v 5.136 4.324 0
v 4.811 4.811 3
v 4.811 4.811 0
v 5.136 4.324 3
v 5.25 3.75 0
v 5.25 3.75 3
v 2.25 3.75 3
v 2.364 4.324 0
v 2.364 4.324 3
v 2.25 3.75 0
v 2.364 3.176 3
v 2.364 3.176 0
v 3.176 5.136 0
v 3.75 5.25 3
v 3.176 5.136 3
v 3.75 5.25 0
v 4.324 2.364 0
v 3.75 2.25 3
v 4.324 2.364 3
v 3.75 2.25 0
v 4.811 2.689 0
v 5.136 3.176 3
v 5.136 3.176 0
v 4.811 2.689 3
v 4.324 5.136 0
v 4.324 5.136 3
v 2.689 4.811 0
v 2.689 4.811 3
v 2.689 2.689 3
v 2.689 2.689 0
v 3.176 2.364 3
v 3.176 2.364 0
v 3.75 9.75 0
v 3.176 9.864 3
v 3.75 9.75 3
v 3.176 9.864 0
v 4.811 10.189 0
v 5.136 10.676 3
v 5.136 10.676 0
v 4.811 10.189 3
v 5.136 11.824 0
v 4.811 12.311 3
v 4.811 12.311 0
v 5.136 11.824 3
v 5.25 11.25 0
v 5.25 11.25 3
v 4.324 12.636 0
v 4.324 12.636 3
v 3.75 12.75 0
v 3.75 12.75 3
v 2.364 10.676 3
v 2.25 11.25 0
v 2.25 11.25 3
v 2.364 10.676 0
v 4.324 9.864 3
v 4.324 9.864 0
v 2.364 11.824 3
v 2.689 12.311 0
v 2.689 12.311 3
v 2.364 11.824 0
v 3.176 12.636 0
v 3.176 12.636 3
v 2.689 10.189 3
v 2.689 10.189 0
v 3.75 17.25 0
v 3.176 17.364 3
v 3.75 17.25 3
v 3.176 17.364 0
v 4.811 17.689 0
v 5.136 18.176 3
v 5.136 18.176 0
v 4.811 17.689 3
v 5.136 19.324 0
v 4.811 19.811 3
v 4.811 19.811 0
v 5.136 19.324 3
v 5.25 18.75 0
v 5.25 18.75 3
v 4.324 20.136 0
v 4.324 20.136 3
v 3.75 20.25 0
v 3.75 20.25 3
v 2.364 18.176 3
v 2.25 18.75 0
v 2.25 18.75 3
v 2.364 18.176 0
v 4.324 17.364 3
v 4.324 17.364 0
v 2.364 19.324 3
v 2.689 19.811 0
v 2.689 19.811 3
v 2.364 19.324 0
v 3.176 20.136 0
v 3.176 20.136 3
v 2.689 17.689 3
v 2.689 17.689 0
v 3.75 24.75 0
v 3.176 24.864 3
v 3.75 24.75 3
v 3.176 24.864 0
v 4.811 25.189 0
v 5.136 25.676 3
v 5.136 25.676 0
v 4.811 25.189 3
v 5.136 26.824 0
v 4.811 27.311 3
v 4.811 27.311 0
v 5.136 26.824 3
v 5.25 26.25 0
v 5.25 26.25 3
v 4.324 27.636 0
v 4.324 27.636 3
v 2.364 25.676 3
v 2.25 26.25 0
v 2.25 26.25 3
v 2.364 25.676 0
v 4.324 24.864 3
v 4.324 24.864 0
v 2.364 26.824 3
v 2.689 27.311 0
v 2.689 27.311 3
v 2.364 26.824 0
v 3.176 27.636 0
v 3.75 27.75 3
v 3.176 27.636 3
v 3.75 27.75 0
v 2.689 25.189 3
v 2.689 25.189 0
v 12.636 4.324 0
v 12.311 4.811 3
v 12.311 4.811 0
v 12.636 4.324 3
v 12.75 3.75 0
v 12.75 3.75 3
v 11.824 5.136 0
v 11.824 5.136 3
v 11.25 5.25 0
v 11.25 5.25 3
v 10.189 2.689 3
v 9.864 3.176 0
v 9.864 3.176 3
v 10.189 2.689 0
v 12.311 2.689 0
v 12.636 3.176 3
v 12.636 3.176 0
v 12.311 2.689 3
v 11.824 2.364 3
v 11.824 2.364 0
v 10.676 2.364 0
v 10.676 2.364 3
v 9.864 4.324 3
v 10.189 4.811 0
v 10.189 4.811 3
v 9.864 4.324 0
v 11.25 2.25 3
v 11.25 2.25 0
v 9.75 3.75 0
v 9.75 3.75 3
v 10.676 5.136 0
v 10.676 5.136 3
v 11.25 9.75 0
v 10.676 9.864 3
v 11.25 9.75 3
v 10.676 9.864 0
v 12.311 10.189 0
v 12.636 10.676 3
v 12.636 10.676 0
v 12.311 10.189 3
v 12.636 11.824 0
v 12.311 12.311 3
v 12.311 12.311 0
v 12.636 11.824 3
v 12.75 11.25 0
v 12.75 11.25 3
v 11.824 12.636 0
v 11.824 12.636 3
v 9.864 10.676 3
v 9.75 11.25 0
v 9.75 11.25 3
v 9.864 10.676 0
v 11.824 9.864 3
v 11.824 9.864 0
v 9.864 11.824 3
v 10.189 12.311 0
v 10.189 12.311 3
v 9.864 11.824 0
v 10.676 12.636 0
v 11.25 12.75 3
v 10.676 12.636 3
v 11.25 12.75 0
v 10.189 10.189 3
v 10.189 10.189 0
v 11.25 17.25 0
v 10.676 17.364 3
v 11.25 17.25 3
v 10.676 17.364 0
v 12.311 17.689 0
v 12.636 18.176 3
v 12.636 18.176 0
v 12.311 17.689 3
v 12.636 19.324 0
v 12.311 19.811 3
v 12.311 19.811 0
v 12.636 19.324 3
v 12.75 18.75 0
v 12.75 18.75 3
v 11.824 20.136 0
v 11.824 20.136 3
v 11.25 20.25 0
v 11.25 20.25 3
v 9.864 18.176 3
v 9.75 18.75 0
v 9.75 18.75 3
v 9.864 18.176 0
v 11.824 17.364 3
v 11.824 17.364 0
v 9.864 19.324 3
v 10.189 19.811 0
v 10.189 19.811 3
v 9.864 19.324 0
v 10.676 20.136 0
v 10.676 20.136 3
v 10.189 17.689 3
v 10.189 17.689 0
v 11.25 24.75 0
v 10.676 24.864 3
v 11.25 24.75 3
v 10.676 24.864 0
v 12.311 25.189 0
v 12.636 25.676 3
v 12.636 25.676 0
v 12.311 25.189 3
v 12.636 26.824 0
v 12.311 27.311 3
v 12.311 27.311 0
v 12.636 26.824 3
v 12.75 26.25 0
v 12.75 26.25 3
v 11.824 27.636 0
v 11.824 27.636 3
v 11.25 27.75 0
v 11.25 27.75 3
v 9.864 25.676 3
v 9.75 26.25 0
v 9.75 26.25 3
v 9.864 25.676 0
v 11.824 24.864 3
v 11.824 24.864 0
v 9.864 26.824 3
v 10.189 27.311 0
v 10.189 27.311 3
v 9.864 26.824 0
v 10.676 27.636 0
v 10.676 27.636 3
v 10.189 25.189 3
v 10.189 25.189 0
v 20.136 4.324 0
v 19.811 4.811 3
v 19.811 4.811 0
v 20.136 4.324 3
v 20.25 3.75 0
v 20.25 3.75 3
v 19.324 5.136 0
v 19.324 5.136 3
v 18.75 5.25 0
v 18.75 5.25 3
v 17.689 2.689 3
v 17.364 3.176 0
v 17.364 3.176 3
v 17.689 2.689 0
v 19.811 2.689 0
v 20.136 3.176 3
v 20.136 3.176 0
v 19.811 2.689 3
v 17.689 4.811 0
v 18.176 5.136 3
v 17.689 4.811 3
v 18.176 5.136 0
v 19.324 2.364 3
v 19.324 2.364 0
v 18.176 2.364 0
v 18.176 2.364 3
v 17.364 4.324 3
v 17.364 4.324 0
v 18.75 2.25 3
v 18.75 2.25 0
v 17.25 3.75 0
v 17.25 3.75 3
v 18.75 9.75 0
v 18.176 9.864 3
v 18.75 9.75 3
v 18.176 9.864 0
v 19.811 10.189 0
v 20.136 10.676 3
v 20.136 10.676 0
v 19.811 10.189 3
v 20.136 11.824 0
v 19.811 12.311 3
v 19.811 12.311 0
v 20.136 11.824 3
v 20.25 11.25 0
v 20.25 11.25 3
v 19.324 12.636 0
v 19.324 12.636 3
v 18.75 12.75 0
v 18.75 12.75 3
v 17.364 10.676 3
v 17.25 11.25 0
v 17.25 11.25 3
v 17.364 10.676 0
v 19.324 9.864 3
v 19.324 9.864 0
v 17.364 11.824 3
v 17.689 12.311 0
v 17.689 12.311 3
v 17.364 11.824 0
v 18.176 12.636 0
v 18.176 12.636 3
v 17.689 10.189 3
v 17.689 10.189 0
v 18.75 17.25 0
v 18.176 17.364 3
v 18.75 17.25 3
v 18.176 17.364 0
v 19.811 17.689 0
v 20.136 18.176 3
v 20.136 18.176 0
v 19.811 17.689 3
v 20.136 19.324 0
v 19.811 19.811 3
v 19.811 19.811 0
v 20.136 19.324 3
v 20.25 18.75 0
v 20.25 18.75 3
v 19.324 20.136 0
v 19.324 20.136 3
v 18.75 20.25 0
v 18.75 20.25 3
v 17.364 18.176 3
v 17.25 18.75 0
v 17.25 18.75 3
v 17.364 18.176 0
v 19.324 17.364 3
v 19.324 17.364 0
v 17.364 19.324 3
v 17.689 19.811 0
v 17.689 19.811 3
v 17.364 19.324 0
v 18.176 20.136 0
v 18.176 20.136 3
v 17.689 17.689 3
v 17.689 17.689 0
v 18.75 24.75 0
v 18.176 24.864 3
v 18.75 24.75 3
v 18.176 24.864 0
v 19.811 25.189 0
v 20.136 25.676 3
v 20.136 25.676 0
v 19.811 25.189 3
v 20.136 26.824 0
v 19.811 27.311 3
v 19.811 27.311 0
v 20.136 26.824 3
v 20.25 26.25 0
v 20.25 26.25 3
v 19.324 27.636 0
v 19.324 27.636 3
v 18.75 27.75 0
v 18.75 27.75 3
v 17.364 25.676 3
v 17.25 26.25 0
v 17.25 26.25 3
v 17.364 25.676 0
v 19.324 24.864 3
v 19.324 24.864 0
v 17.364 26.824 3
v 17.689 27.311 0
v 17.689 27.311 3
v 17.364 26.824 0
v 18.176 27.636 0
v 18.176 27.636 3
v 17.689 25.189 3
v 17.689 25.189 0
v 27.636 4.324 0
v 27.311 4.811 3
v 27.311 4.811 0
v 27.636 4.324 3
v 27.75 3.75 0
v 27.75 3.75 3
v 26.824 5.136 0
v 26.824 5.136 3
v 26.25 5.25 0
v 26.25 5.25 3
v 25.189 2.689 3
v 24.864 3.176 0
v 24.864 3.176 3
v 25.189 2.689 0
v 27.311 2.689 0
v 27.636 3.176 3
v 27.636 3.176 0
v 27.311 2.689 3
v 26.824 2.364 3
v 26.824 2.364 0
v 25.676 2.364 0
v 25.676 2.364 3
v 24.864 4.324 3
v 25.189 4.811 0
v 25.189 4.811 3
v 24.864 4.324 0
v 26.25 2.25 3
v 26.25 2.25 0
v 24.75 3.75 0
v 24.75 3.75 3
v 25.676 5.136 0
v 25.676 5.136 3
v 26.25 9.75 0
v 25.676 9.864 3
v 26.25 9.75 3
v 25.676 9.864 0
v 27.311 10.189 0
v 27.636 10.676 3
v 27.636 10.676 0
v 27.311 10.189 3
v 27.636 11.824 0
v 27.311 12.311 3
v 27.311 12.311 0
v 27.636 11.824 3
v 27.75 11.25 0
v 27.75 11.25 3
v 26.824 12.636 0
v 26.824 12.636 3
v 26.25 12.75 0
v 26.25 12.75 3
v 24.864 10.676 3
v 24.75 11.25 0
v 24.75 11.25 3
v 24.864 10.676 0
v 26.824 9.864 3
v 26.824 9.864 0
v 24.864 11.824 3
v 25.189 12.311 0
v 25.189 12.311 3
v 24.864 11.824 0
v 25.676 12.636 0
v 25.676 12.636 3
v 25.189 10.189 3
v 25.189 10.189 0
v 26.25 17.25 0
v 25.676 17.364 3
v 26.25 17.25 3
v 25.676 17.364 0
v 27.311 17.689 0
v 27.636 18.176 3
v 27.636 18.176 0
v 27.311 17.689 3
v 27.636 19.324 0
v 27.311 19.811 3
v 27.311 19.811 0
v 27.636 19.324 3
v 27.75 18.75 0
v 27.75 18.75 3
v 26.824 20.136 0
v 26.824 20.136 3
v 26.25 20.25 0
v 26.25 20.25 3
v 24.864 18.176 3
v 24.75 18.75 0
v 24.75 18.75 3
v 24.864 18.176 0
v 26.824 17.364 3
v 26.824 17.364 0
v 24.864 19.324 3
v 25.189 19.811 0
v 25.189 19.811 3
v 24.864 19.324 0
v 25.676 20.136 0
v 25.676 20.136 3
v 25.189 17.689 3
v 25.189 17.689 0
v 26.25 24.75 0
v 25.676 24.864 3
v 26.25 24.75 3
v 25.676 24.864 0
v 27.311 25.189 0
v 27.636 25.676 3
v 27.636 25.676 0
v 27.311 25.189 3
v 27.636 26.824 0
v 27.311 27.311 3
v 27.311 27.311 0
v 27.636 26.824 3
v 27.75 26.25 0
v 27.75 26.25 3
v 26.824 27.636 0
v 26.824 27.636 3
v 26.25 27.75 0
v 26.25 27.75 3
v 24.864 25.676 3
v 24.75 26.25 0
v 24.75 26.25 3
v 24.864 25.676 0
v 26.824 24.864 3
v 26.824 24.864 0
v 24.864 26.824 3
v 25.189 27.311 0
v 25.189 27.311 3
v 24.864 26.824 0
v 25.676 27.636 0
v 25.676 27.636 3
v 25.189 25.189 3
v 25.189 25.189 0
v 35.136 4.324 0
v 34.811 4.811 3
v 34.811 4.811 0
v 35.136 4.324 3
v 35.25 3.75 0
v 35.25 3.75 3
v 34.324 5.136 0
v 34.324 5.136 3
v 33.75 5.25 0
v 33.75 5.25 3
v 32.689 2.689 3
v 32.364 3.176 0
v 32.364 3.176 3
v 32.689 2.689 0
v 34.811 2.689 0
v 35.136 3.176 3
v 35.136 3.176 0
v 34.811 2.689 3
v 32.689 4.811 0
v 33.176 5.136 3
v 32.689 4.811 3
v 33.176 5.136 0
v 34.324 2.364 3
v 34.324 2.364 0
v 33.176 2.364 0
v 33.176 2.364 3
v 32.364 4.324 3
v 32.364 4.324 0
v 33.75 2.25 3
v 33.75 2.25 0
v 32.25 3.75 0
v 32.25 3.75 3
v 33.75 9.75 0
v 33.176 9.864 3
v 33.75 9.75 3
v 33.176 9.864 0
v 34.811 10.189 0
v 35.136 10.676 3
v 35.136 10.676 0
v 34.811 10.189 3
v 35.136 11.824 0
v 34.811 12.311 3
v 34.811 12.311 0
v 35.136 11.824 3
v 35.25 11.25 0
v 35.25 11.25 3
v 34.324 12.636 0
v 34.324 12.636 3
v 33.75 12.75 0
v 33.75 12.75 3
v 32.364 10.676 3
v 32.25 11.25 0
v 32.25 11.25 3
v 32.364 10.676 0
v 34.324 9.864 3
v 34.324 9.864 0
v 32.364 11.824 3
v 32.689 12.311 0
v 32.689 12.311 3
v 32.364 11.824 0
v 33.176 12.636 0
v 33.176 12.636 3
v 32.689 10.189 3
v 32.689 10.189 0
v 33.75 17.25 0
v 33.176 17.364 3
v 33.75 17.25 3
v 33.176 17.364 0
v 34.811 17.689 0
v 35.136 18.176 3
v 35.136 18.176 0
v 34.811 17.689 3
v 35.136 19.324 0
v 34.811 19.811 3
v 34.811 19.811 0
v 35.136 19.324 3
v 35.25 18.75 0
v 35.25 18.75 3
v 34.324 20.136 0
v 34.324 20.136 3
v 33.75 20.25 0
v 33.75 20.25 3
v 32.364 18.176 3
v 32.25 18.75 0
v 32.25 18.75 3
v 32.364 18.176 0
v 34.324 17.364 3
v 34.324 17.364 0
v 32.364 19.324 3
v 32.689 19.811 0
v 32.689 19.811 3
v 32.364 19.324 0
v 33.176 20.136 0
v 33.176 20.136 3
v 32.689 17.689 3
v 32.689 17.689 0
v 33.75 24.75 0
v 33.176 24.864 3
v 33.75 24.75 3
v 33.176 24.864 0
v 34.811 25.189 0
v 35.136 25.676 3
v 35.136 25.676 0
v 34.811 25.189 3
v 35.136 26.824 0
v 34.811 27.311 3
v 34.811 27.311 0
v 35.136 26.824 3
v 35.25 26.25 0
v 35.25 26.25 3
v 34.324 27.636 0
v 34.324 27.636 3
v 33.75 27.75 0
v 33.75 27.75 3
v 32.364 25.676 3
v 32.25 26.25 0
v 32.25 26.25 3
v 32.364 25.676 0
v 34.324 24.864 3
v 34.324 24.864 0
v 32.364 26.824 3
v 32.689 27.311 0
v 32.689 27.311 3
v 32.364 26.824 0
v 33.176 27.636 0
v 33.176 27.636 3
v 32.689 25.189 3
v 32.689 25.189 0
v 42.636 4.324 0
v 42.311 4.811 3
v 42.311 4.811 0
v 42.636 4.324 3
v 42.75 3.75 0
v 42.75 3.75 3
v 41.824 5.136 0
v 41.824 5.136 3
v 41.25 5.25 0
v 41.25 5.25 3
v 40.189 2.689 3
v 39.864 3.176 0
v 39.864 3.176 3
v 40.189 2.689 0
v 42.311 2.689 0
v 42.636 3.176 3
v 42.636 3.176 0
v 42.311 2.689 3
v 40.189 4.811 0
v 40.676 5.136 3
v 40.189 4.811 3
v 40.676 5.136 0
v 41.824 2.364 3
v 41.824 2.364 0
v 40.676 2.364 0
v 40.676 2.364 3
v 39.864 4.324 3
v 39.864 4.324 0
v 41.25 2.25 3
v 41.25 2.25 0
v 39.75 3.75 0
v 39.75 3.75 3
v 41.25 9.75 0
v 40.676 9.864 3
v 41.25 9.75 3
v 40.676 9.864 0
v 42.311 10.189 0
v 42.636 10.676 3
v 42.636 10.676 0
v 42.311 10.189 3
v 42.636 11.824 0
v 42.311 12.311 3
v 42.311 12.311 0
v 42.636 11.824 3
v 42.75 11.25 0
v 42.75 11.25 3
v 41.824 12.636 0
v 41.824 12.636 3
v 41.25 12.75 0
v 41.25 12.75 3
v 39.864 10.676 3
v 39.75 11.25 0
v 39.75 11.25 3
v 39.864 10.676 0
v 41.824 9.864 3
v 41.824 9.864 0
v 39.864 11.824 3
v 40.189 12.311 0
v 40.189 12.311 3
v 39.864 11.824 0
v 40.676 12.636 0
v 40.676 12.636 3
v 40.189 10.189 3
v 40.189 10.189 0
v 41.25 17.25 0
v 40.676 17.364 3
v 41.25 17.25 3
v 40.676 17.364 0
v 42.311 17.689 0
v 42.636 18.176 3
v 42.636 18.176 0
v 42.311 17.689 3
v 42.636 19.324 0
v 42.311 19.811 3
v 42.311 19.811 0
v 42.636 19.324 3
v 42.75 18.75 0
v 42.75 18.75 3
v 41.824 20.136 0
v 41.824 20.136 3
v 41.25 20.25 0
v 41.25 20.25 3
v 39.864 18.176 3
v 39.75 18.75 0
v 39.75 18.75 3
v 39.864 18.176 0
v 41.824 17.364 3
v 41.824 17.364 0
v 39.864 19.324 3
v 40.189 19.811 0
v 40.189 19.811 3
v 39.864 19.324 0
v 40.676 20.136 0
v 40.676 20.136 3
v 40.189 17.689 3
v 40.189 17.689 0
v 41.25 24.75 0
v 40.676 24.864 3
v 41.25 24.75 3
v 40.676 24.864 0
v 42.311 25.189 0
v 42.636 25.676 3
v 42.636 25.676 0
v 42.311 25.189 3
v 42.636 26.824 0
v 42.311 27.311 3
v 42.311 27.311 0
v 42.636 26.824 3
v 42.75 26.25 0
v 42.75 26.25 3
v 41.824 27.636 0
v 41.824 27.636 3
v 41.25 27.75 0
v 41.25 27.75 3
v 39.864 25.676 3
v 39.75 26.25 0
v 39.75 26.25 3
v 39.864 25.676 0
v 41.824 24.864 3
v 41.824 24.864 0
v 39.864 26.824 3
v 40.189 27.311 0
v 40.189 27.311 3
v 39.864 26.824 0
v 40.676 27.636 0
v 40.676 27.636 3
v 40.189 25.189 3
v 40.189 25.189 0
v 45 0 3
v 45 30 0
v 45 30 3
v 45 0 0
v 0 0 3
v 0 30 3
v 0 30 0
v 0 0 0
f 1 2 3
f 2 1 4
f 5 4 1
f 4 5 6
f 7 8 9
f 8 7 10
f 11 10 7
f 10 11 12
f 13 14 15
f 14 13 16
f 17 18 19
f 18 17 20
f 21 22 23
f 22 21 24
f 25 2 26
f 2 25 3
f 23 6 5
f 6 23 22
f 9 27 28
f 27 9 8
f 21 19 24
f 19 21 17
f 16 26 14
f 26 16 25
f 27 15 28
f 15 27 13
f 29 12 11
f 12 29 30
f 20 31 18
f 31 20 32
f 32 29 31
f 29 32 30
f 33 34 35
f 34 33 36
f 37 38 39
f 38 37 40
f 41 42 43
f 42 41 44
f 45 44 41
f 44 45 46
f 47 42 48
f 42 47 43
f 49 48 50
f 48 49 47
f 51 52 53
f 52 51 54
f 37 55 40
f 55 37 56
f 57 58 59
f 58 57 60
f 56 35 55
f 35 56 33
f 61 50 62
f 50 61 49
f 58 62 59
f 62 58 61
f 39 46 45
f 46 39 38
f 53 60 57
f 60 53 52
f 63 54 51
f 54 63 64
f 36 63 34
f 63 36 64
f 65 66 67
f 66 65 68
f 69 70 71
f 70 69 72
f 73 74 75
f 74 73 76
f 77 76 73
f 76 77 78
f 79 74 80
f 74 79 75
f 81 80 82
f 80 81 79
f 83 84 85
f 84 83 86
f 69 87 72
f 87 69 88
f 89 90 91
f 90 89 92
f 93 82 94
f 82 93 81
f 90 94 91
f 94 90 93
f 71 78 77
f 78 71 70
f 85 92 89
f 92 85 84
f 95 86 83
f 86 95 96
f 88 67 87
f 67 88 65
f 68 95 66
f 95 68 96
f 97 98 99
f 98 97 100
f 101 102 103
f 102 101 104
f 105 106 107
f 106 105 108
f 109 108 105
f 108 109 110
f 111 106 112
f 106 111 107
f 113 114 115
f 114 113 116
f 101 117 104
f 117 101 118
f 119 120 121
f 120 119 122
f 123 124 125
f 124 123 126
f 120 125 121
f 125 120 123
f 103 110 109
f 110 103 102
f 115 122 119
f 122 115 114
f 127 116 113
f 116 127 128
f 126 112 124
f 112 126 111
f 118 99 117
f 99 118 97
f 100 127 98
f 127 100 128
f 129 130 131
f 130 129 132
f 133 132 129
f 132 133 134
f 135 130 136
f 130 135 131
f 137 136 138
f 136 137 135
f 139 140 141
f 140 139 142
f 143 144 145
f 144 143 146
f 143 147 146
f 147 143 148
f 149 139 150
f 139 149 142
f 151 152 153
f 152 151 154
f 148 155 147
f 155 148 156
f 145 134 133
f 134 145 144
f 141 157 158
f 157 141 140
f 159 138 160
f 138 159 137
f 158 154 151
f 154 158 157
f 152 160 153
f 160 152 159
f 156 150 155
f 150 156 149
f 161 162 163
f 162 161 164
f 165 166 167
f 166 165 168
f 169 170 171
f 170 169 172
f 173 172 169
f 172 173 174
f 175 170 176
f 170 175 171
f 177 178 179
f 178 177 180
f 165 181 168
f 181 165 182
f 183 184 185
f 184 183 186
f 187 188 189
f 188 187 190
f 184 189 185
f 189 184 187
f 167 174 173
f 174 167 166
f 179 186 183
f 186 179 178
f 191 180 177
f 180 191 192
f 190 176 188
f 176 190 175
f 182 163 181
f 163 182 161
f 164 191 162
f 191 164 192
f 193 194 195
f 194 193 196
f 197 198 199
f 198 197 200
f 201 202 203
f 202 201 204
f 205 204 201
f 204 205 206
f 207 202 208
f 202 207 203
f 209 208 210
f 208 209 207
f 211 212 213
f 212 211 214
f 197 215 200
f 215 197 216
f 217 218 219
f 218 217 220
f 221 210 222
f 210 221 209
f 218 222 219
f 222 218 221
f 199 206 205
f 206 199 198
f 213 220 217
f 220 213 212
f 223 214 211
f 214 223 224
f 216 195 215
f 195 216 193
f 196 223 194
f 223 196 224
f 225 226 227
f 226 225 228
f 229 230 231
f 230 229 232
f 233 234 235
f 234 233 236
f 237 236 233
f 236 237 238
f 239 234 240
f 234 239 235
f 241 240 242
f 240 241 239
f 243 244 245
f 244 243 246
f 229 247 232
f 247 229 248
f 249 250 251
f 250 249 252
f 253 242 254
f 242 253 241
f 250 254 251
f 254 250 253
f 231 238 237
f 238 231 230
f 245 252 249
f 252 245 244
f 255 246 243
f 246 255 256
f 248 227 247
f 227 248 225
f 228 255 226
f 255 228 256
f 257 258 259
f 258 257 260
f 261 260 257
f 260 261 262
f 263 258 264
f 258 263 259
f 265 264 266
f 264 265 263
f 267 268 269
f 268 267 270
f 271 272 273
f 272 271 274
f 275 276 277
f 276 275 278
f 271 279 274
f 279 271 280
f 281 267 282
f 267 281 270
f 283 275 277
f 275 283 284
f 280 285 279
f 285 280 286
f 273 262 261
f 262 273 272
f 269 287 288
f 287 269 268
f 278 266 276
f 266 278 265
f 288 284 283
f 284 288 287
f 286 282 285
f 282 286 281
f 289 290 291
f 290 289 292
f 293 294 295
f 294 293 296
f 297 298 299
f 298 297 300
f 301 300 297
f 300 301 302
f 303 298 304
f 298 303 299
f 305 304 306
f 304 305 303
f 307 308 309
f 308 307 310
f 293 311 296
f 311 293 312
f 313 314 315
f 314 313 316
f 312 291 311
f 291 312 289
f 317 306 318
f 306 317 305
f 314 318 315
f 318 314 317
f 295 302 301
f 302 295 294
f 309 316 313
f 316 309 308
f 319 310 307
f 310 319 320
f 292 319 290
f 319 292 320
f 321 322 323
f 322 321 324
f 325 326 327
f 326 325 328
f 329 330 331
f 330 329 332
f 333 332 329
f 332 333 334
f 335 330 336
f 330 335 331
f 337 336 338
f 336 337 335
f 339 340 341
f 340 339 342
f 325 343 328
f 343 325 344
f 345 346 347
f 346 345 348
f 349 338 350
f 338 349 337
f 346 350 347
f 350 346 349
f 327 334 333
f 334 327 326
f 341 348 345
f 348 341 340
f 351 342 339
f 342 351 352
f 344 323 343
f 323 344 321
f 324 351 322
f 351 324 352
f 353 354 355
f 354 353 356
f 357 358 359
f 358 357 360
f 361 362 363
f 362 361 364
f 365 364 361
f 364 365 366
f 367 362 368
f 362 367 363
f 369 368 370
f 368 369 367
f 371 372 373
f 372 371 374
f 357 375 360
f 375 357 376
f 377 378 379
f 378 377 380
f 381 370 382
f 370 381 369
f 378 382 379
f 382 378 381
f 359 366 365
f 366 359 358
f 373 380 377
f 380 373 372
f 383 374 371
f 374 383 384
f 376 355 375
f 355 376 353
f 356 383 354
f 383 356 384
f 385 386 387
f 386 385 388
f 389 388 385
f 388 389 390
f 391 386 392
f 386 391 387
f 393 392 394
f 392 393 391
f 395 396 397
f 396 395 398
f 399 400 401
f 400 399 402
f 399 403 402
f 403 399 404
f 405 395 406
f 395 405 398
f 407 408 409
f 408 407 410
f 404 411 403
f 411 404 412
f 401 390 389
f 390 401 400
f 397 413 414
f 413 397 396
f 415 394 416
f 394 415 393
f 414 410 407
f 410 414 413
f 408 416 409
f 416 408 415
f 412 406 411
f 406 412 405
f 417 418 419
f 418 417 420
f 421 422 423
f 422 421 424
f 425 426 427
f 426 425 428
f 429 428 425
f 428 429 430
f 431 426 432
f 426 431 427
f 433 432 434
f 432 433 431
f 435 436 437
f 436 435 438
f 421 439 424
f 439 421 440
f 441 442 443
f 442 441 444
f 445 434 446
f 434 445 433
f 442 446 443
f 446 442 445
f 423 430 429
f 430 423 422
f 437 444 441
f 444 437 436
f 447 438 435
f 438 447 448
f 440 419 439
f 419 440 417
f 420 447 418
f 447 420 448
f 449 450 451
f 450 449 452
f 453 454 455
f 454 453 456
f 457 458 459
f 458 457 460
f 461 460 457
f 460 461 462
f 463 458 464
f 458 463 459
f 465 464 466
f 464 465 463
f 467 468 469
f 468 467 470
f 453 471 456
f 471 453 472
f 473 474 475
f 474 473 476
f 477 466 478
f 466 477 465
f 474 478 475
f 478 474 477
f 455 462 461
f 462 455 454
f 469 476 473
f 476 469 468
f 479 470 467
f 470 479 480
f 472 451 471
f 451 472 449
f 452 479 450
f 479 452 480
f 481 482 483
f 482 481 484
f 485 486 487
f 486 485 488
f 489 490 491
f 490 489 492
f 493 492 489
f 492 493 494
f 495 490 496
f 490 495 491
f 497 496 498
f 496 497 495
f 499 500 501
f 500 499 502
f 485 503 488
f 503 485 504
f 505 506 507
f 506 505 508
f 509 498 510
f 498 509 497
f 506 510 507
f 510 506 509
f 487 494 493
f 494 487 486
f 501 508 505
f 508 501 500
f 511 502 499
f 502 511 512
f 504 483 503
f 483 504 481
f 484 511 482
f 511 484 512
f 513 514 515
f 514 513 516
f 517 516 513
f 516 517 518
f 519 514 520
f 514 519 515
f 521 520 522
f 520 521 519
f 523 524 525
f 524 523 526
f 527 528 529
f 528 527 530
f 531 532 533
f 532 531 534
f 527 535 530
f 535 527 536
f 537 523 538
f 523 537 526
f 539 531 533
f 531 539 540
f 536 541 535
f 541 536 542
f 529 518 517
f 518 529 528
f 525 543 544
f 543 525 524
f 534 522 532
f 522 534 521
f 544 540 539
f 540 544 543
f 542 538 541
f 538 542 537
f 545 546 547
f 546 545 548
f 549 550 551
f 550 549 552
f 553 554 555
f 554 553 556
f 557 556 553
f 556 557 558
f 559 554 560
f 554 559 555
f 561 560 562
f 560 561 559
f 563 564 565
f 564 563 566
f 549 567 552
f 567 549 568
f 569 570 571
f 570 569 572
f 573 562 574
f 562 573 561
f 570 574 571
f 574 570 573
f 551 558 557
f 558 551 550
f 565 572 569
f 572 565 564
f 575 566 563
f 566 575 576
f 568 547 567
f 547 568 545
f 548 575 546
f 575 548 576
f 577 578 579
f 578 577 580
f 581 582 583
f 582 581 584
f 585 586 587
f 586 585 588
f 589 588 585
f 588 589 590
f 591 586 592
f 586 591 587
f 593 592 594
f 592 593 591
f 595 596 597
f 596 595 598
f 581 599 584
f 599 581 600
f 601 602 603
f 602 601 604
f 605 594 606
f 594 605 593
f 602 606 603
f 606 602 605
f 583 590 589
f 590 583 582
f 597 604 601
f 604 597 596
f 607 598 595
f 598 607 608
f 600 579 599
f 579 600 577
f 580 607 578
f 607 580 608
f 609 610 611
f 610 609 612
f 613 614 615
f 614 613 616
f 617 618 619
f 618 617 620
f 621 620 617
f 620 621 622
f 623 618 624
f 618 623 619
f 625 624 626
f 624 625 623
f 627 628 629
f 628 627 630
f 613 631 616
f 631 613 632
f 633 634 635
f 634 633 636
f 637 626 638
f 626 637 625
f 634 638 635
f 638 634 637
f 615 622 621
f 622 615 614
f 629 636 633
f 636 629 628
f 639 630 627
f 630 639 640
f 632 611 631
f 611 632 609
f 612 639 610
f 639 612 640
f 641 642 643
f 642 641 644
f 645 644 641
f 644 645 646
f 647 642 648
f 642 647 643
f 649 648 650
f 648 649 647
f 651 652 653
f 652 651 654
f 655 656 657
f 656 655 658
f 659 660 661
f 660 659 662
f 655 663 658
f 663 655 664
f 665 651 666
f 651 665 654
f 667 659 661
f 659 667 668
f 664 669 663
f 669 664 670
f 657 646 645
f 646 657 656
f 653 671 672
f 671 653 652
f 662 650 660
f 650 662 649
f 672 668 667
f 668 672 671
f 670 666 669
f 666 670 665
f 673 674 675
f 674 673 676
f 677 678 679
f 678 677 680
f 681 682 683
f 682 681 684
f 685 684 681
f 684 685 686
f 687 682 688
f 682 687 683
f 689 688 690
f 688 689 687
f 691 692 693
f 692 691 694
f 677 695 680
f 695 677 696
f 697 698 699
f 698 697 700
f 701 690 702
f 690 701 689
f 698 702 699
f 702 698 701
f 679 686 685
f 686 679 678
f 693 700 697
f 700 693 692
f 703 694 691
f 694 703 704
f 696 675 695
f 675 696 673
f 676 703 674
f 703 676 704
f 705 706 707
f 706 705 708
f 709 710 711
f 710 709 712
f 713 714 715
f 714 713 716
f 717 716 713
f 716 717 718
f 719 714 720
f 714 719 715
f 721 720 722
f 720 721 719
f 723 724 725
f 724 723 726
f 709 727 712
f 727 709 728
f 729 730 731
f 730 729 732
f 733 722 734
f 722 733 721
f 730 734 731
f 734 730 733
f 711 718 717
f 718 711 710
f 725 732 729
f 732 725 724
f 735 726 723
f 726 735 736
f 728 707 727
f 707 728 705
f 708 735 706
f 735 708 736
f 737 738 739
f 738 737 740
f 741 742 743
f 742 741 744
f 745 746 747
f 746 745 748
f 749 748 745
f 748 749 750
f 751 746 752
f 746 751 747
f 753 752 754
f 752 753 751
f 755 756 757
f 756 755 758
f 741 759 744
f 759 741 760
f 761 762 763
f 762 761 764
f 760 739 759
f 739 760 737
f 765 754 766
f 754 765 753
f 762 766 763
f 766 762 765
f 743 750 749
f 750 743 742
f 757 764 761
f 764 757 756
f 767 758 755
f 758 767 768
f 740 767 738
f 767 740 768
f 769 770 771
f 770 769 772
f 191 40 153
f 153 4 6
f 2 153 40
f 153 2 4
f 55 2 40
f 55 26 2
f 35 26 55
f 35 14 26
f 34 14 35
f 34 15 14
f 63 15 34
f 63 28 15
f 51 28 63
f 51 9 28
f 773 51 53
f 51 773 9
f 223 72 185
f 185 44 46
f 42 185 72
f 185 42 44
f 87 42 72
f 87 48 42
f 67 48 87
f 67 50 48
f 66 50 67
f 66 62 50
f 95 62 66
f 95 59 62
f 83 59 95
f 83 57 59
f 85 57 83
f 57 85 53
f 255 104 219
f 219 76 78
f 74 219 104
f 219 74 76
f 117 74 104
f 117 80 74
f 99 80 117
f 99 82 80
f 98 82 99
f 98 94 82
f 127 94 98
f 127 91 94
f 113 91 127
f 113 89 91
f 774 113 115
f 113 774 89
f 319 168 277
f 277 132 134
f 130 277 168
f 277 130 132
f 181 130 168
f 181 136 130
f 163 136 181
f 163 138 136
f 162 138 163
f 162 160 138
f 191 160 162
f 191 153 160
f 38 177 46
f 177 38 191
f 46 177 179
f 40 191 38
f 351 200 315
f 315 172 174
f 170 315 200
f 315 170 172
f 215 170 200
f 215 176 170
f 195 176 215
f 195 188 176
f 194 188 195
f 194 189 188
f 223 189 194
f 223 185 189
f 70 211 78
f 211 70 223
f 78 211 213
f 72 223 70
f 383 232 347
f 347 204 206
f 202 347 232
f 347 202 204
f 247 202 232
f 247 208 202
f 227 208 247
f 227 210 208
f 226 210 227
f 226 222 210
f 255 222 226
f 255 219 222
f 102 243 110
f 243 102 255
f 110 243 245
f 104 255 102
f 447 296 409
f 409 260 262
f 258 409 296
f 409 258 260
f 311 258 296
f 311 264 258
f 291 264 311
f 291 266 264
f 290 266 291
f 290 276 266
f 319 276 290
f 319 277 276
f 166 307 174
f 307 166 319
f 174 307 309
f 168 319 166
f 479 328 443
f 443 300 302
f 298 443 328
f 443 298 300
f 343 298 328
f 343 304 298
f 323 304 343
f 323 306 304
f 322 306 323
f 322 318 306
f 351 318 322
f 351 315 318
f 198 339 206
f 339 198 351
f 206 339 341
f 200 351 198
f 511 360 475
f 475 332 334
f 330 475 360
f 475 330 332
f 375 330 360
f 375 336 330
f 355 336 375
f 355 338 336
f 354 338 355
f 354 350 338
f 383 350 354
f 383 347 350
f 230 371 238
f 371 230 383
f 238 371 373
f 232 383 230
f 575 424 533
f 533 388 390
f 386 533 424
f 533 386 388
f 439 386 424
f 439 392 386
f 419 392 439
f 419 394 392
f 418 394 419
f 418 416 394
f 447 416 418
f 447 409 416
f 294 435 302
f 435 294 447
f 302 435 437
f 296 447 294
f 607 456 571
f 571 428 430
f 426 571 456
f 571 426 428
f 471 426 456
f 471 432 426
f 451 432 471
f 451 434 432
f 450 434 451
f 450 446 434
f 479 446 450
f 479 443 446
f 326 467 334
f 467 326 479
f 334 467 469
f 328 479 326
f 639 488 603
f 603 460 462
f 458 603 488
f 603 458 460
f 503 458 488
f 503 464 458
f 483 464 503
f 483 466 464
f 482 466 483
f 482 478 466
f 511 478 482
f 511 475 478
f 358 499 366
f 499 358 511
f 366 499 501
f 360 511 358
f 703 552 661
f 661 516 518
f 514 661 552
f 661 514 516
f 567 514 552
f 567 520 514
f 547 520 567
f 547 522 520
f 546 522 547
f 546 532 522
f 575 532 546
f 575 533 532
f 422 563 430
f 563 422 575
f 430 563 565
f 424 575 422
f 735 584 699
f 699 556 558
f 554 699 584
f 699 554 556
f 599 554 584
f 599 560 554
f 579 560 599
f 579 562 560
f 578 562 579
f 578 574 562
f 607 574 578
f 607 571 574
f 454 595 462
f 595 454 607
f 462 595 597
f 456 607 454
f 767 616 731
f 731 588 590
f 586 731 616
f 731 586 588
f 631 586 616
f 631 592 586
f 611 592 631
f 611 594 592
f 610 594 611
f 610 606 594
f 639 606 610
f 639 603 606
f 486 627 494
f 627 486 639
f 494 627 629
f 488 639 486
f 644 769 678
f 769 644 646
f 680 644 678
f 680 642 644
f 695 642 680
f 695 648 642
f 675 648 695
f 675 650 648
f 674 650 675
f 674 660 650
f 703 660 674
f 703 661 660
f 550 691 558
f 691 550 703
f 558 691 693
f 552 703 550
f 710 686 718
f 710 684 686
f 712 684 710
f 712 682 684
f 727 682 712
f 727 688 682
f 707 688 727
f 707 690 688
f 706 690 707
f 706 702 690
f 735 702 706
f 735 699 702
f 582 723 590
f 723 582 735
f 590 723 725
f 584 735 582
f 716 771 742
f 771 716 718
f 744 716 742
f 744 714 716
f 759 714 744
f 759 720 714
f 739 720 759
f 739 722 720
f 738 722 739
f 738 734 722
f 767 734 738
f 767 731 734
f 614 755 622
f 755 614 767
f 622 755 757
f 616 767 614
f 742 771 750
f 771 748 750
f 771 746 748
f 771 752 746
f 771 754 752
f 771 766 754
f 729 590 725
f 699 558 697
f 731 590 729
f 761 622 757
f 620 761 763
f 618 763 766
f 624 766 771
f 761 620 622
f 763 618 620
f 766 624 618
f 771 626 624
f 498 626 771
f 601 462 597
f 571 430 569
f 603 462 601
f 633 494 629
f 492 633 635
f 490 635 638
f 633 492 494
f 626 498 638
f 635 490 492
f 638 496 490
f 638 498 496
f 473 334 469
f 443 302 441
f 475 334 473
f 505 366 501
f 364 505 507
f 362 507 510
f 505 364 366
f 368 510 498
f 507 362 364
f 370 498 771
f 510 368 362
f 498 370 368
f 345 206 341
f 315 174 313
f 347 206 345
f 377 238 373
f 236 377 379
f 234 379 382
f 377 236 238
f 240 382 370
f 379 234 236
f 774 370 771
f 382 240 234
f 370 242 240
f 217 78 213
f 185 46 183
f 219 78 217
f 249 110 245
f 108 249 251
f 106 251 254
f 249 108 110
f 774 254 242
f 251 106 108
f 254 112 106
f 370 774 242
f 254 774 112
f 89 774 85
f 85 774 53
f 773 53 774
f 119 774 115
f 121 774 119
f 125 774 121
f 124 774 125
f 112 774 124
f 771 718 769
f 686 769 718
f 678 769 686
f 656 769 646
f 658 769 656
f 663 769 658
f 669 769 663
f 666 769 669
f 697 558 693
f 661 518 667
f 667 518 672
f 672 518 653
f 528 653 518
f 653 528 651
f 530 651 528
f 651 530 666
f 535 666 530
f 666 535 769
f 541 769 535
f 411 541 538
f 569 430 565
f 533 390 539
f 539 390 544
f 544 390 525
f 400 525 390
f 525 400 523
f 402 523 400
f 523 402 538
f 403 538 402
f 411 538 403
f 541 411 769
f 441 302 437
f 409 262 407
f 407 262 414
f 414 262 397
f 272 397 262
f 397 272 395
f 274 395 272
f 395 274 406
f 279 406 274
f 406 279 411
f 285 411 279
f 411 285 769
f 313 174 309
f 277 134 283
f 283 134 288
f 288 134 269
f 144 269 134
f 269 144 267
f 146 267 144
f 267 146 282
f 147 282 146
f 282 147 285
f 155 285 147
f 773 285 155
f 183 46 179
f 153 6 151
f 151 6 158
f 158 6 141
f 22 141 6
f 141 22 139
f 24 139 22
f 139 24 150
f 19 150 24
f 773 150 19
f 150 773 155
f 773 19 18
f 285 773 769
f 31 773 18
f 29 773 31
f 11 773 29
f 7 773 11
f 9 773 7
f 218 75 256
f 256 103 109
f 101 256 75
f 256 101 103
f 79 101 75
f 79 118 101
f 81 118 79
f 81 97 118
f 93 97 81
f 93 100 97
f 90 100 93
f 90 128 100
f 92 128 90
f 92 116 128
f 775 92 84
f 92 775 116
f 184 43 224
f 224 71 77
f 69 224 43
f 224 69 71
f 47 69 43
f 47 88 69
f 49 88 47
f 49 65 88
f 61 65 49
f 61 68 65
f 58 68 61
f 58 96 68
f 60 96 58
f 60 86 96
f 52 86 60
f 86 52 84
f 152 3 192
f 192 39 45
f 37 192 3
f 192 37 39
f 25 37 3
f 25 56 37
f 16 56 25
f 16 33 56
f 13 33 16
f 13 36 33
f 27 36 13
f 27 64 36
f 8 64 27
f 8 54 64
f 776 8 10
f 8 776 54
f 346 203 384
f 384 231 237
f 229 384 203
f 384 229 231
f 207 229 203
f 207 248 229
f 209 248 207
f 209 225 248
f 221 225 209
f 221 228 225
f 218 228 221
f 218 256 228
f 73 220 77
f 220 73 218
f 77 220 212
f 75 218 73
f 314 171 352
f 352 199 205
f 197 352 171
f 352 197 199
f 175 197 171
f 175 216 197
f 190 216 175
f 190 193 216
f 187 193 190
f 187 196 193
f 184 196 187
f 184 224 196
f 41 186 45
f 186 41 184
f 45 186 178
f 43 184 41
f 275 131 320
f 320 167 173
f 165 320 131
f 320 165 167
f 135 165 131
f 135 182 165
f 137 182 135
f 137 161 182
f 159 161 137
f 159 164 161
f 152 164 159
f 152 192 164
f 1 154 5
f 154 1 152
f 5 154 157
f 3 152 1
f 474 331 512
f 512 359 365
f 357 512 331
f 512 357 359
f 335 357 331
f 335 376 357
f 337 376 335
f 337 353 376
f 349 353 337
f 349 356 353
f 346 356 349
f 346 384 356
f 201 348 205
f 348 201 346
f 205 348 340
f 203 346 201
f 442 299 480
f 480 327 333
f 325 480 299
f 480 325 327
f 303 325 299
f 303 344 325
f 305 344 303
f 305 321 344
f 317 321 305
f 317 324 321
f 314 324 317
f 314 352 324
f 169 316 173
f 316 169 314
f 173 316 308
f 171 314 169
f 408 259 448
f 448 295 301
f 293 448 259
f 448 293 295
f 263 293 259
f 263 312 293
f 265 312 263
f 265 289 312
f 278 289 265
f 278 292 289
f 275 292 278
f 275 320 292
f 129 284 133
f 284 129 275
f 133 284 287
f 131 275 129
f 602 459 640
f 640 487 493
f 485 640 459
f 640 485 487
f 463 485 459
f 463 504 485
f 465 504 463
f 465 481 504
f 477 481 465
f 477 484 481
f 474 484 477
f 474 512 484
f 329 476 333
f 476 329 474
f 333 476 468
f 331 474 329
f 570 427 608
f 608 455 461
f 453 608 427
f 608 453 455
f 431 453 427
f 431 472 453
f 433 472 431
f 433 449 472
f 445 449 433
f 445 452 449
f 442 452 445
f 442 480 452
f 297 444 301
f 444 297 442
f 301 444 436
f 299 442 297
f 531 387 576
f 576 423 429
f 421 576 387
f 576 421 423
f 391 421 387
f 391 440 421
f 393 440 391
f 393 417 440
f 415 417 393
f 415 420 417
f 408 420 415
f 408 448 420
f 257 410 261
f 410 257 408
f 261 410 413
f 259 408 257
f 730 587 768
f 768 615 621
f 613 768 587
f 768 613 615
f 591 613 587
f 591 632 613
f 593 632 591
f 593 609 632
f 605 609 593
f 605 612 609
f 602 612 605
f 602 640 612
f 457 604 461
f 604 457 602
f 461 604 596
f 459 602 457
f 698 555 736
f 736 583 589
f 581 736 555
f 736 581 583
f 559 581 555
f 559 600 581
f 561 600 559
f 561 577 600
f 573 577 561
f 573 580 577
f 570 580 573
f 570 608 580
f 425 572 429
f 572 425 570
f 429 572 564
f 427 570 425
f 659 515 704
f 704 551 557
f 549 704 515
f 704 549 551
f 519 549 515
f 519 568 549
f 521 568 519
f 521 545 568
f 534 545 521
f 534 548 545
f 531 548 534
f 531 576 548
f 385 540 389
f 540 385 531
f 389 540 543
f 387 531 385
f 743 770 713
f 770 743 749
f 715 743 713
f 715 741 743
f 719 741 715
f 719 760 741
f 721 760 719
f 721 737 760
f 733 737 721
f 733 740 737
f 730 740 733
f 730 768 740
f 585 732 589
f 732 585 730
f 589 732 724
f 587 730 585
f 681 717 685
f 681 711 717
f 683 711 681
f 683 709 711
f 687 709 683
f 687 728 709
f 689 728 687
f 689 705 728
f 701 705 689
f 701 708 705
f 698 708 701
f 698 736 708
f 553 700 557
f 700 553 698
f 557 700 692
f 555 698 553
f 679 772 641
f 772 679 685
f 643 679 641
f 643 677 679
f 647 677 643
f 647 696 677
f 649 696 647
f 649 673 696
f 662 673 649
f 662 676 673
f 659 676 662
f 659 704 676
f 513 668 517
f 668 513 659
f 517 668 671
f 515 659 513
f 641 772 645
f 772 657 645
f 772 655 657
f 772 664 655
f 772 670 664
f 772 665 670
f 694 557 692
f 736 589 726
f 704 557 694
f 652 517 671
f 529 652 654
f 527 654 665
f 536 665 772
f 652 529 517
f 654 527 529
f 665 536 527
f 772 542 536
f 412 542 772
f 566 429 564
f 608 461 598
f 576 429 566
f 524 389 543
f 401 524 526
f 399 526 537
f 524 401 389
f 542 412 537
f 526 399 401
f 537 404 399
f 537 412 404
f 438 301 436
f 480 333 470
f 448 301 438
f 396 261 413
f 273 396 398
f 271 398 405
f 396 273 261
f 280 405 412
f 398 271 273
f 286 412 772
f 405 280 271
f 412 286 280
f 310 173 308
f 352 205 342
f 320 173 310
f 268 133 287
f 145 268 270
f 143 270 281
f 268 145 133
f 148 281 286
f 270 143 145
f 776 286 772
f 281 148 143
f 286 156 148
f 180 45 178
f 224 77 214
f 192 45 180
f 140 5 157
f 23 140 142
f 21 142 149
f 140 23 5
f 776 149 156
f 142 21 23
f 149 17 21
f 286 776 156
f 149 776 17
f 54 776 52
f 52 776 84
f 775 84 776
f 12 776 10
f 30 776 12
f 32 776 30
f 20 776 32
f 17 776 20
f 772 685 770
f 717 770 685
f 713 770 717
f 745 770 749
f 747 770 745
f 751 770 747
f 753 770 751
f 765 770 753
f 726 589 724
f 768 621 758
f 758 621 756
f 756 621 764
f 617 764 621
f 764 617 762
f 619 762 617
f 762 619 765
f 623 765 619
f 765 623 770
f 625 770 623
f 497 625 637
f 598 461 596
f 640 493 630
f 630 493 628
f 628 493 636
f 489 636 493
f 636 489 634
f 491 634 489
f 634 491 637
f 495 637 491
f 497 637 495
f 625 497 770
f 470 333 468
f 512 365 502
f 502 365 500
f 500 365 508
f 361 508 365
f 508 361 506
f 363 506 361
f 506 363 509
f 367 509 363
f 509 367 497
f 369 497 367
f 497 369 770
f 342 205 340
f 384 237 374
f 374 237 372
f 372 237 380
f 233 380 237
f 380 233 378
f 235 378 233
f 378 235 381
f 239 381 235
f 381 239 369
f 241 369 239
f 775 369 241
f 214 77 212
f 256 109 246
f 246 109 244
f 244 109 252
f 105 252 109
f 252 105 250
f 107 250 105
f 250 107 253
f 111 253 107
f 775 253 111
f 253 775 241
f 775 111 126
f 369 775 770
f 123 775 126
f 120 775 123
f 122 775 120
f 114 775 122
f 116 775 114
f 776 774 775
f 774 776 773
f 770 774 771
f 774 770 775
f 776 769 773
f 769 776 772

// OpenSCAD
use <../nscad-lib.scad>

color("lightgray") difference() {
  cube([45, 30, 3]);
  move(3.75, 3.75, -5) raster(6, 4);
}
